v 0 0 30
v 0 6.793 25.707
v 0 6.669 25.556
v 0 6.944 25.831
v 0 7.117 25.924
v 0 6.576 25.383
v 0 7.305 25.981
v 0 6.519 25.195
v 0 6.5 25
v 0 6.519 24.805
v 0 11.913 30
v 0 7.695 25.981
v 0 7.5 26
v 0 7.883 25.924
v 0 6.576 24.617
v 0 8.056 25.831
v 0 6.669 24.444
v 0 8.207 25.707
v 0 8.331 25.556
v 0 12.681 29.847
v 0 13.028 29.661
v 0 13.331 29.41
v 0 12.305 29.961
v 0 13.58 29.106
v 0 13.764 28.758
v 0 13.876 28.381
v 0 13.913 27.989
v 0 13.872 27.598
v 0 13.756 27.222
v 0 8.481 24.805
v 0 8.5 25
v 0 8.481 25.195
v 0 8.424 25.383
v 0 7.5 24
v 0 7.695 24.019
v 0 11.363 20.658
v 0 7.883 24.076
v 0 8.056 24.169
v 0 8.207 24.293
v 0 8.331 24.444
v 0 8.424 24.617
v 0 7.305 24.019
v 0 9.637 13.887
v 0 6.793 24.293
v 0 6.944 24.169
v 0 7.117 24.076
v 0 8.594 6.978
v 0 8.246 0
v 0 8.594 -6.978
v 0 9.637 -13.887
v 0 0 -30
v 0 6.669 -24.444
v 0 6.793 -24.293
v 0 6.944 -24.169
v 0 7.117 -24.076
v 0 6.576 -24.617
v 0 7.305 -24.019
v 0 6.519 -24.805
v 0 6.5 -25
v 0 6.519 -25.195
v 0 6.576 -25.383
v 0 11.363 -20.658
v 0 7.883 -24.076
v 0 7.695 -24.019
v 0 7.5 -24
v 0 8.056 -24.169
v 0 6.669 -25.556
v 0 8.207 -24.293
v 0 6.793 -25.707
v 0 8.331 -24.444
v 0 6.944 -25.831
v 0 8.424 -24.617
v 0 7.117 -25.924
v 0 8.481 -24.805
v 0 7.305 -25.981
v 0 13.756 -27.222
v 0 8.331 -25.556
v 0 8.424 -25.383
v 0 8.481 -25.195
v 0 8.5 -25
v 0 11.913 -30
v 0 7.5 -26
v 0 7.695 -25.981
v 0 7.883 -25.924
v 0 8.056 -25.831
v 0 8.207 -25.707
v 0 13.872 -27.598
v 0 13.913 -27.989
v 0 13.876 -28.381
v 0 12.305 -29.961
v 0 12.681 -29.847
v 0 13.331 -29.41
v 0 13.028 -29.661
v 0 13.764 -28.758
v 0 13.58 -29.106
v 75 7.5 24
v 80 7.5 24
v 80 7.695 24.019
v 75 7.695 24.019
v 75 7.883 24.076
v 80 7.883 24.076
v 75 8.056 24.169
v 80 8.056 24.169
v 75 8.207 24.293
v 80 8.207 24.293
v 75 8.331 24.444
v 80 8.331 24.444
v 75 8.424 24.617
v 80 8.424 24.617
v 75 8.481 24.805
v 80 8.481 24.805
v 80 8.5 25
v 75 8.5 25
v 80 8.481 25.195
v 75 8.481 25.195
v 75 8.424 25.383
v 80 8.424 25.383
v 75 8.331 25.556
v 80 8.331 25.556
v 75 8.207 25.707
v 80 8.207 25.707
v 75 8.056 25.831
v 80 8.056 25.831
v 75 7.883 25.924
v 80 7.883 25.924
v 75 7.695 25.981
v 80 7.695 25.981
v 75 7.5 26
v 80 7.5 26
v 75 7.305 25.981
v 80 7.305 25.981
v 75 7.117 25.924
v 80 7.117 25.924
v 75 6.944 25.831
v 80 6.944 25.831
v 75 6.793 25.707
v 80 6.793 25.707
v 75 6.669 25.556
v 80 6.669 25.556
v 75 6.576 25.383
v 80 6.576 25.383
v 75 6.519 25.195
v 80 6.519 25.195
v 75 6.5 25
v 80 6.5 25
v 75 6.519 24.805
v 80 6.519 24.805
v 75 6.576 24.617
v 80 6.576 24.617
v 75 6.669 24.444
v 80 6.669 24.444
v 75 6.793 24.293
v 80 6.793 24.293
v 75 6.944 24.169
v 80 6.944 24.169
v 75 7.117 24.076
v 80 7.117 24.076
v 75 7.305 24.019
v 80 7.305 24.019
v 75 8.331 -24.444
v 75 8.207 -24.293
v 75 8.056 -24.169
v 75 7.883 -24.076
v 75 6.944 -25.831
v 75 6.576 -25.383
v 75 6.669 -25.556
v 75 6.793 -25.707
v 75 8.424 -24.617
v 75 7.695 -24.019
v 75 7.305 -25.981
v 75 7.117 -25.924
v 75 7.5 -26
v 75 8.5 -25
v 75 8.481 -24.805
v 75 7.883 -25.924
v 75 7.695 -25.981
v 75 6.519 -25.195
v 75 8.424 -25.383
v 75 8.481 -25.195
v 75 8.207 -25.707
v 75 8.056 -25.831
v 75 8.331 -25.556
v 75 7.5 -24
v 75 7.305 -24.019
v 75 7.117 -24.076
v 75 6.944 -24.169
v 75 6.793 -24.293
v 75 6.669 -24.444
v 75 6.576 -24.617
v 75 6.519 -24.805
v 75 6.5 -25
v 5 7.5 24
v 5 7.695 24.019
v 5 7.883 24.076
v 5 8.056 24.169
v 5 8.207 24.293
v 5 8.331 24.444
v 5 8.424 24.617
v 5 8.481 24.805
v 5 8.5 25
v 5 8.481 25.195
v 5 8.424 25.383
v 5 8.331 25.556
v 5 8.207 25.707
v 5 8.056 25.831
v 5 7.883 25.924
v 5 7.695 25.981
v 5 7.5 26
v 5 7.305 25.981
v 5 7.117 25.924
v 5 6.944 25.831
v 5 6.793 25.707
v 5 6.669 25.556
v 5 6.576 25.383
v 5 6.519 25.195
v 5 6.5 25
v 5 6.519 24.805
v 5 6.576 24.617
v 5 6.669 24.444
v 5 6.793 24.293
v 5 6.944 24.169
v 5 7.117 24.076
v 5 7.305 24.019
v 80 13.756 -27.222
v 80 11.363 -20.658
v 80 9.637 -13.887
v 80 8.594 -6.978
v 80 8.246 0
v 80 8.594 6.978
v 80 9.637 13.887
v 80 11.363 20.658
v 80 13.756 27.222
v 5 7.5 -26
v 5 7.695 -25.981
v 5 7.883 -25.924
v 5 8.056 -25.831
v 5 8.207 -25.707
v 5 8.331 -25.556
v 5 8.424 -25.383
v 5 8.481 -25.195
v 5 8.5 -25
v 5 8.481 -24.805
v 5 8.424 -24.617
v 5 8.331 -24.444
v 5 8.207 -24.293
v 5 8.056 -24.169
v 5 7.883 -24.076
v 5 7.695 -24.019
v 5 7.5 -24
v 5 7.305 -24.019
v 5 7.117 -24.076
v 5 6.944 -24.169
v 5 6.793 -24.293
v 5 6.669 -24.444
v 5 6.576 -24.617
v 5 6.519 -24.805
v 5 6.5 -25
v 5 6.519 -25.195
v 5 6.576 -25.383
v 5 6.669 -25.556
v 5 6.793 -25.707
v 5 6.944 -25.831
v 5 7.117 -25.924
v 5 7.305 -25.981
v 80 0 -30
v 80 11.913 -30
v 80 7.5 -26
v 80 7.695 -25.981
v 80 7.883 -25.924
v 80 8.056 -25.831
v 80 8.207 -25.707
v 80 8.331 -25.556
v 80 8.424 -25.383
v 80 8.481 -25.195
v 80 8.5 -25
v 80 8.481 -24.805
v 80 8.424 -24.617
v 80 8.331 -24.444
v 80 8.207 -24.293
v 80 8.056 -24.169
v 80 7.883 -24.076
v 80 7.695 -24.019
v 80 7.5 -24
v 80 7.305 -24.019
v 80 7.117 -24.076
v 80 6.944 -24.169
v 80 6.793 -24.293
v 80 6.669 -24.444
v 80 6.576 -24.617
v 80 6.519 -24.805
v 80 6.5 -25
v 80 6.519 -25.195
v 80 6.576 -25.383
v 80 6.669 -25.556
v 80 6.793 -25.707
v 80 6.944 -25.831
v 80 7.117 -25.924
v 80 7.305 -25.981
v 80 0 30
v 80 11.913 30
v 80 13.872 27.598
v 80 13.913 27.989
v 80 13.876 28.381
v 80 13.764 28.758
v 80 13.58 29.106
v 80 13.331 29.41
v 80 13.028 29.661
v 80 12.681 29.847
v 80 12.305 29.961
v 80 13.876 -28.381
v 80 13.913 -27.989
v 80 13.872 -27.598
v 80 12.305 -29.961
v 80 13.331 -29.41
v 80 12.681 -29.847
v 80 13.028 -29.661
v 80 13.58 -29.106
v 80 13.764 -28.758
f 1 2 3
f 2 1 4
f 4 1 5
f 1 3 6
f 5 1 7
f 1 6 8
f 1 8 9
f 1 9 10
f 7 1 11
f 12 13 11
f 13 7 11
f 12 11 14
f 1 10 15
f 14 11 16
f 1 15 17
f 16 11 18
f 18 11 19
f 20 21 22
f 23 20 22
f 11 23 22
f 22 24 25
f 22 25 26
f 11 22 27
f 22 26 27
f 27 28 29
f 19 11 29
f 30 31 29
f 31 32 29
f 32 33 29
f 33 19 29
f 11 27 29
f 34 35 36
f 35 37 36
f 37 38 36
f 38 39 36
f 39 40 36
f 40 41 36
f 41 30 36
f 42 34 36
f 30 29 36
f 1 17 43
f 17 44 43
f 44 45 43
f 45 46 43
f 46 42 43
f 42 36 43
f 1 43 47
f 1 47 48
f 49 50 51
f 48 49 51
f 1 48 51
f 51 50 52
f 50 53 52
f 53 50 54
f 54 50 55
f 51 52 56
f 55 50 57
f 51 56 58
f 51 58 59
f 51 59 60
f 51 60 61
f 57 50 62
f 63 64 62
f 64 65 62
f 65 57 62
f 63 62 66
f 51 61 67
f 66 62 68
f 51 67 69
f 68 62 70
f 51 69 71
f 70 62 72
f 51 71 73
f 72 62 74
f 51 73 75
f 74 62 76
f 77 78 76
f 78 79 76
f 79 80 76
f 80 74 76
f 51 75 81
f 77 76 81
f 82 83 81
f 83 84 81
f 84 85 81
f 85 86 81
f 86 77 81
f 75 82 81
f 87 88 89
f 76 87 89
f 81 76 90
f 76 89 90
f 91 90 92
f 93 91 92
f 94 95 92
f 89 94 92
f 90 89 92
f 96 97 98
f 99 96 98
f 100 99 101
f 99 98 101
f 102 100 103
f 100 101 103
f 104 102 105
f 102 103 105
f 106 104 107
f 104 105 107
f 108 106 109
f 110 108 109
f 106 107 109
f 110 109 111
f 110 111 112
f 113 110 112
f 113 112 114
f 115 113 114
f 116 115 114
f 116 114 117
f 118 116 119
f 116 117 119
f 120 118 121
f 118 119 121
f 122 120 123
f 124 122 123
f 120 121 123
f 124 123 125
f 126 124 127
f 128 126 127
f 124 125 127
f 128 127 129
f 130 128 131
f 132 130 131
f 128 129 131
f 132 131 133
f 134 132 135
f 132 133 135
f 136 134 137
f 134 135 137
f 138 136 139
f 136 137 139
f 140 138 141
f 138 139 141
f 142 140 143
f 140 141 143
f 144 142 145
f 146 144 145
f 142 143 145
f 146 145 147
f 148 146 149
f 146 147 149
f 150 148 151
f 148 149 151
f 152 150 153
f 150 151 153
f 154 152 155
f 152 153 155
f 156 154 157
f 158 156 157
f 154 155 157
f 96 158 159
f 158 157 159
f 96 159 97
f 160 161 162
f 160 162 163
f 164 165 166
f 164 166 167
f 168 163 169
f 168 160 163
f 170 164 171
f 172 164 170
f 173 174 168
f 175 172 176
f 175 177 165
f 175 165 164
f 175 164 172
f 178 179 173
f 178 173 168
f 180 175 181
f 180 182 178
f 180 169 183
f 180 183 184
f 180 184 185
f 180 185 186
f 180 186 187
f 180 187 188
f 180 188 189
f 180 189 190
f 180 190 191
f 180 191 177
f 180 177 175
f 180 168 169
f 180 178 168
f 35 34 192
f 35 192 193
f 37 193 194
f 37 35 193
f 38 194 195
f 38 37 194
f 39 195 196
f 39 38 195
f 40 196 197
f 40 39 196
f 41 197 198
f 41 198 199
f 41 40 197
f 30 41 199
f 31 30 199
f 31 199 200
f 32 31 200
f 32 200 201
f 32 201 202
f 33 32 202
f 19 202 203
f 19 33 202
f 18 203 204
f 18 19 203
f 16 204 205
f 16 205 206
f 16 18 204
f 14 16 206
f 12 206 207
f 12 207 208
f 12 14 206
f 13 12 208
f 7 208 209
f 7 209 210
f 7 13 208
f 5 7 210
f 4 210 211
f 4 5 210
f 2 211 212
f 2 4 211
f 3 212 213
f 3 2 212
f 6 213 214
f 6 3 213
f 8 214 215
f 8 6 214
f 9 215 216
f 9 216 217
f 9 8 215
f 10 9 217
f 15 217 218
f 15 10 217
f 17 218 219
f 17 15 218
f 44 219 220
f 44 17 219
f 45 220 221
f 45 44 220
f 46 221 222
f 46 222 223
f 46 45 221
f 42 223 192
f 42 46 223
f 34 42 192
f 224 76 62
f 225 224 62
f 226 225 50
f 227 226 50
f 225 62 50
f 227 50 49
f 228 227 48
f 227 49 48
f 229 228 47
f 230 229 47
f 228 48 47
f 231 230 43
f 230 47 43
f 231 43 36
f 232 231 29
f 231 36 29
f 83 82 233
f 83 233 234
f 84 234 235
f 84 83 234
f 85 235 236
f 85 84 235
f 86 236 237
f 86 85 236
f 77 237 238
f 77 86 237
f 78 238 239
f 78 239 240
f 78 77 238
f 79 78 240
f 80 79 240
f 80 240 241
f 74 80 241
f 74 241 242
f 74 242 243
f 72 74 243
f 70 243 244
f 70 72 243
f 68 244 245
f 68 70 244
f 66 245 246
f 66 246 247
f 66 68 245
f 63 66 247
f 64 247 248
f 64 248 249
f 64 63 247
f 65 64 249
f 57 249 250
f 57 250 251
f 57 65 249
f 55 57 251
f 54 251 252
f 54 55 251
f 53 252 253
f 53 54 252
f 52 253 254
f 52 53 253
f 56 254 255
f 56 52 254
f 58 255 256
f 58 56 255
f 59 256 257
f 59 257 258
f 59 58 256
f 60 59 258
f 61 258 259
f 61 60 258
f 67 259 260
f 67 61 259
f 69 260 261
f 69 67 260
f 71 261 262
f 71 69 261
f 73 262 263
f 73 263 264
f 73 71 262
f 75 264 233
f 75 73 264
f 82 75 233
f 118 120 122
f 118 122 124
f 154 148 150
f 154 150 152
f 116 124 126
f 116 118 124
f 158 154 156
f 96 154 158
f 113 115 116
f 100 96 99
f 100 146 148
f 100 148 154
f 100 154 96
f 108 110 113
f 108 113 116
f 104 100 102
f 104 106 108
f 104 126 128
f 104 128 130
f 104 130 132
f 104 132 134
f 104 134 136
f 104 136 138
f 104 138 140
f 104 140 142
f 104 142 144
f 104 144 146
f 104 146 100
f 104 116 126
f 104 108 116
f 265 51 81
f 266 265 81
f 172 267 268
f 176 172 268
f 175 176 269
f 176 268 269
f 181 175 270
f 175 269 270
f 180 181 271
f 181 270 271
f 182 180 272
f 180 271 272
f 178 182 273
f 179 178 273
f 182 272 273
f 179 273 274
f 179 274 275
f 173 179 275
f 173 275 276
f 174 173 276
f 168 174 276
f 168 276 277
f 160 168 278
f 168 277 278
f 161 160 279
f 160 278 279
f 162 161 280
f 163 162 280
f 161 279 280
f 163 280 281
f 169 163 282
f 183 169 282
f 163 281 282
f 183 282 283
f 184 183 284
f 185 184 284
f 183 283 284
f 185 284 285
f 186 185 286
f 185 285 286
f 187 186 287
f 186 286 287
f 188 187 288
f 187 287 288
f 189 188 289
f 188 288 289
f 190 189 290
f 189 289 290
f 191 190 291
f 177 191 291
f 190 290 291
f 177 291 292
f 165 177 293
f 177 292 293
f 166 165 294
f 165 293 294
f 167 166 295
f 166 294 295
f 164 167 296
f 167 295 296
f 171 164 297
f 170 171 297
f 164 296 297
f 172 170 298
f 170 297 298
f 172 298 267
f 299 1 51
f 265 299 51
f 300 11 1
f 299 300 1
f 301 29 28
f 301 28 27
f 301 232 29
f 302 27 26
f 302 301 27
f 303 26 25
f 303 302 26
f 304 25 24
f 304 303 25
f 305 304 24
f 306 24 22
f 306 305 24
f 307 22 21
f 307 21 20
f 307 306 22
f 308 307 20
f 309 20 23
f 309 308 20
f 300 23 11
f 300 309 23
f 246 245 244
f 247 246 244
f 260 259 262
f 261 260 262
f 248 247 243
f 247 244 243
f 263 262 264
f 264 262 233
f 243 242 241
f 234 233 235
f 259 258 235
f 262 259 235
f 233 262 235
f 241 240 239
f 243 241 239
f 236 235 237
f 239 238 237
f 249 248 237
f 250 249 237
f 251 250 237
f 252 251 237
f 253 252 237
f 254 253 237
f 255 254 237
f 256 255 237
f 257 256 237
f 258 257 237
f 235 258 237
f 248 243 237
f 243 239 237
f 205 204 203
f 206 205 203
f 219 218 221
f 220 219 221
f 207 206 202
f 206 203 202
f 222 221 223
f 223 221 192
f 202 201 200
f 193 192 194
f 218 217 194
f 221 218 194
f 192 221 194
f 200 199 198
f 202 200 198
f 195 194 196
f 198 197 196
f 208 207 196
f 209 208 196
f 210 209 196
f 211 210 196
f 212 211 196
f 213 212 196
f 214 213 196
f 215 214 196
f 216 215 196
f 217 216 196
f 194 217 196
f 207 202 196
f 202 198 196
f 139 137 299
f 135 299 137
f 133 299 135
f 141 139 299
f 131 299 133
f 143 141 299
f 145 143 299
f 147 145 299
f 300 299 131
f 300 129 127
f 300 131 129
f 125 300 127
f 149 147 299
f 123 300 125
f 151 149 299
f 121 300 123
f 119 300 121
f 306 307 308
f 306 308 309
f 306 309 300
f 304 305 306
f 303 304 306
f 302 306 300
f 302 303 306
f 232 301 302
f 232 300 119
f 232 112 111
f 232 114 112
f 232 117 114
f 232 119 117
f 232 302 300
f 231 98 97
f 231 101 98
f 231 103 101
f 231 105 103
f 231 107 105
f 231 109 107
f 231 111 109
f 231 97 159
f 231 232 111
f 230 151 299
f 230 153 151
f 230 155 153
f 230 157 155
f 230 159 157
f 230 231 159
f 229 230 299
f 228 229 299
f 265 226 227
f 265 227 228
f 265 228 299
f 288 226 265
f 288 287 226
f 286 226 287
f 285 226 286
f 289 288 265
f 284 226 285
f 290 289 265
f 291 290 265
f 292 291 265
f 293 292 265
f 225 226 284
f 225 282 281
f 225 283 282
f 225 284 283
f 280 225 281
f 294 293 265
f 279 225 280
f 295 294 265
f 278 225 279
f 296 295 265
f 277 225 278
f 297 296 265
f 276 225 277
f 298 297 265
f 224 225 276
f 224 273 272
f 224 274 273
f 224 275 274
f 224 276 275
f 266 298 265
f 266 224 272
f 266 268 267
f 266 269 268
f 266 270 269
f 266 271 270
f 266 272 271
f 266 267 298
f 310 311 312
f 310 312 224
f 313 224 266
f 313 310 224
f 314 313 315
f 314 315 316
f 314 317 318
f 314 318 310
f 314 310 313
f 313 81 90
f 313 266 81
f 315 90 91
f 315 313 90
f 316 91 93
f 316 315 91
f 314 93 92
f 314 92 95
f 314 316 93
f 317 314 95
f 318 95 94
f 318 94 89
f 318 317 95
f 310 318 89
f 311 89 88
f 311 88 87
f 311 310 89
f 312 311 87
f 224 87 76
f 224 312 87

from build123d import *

# Parameters (mm, degrees)
EXTRUDE_1_DEPTH     = 80
FILLET_1_R          = 2
SKETCH_2_R          = 1
CUT_EXTRUDE_1_DEPTH = 5


with BuildPart() as part:
    # 草图1 → 凸台-拉伸1 (new body)
    with BuildSketch(Plane(origin=(0, 0, 0), x_dir=(0, 0, -1), z_dir=(1, 0, 0))):
        with BuildLine():
            Line((-30, 0), (30, 0))
            Line((30, 0), (30, 15))
            ThreePointArc((30, 15), (0, 8.245553203), (-30, 15))
            Line((-30, 15), (-30, 0))
        make_face()
    extrude(amount=EXTRUDE_1_DEPTH)

    # 圆角1
    fillet_1_edges = [part.edges().sort_by_distance(p)[0] for p in [
        (40, 15, 30),
        (40, 15, -30),
    ]]
    fillet(fillet_1_edges, radius=FILLET_1_R)

    # 草图2 → 切除-拉伸1 (cut)
    with BuildSketch(Plane(origin=(80, 0, 0), x_dir=(0, 0, -1), z_dir=(1, 0, 0))):
        with Locations((-25, 7.5)):
            Circle(SKETCH_2_R)
        with Locations((25, 7.5)):
            Circle(SKETCH_2_R)
    cut_extrude_1 = extrude(amount=-CUT_EXTRUDE_1_DEPTH, mode=Mode.SUBTRACT)

    # 镜向1: 切除-拉伸1 across plane
    add(cut_extrude_1.mirror(Plane(origin=(40, 0, 0), x_dir=(0, 0, 1), z_dir=(1, 0, 0))), mode=Mode.SUBTRACT)


solid = part.part
